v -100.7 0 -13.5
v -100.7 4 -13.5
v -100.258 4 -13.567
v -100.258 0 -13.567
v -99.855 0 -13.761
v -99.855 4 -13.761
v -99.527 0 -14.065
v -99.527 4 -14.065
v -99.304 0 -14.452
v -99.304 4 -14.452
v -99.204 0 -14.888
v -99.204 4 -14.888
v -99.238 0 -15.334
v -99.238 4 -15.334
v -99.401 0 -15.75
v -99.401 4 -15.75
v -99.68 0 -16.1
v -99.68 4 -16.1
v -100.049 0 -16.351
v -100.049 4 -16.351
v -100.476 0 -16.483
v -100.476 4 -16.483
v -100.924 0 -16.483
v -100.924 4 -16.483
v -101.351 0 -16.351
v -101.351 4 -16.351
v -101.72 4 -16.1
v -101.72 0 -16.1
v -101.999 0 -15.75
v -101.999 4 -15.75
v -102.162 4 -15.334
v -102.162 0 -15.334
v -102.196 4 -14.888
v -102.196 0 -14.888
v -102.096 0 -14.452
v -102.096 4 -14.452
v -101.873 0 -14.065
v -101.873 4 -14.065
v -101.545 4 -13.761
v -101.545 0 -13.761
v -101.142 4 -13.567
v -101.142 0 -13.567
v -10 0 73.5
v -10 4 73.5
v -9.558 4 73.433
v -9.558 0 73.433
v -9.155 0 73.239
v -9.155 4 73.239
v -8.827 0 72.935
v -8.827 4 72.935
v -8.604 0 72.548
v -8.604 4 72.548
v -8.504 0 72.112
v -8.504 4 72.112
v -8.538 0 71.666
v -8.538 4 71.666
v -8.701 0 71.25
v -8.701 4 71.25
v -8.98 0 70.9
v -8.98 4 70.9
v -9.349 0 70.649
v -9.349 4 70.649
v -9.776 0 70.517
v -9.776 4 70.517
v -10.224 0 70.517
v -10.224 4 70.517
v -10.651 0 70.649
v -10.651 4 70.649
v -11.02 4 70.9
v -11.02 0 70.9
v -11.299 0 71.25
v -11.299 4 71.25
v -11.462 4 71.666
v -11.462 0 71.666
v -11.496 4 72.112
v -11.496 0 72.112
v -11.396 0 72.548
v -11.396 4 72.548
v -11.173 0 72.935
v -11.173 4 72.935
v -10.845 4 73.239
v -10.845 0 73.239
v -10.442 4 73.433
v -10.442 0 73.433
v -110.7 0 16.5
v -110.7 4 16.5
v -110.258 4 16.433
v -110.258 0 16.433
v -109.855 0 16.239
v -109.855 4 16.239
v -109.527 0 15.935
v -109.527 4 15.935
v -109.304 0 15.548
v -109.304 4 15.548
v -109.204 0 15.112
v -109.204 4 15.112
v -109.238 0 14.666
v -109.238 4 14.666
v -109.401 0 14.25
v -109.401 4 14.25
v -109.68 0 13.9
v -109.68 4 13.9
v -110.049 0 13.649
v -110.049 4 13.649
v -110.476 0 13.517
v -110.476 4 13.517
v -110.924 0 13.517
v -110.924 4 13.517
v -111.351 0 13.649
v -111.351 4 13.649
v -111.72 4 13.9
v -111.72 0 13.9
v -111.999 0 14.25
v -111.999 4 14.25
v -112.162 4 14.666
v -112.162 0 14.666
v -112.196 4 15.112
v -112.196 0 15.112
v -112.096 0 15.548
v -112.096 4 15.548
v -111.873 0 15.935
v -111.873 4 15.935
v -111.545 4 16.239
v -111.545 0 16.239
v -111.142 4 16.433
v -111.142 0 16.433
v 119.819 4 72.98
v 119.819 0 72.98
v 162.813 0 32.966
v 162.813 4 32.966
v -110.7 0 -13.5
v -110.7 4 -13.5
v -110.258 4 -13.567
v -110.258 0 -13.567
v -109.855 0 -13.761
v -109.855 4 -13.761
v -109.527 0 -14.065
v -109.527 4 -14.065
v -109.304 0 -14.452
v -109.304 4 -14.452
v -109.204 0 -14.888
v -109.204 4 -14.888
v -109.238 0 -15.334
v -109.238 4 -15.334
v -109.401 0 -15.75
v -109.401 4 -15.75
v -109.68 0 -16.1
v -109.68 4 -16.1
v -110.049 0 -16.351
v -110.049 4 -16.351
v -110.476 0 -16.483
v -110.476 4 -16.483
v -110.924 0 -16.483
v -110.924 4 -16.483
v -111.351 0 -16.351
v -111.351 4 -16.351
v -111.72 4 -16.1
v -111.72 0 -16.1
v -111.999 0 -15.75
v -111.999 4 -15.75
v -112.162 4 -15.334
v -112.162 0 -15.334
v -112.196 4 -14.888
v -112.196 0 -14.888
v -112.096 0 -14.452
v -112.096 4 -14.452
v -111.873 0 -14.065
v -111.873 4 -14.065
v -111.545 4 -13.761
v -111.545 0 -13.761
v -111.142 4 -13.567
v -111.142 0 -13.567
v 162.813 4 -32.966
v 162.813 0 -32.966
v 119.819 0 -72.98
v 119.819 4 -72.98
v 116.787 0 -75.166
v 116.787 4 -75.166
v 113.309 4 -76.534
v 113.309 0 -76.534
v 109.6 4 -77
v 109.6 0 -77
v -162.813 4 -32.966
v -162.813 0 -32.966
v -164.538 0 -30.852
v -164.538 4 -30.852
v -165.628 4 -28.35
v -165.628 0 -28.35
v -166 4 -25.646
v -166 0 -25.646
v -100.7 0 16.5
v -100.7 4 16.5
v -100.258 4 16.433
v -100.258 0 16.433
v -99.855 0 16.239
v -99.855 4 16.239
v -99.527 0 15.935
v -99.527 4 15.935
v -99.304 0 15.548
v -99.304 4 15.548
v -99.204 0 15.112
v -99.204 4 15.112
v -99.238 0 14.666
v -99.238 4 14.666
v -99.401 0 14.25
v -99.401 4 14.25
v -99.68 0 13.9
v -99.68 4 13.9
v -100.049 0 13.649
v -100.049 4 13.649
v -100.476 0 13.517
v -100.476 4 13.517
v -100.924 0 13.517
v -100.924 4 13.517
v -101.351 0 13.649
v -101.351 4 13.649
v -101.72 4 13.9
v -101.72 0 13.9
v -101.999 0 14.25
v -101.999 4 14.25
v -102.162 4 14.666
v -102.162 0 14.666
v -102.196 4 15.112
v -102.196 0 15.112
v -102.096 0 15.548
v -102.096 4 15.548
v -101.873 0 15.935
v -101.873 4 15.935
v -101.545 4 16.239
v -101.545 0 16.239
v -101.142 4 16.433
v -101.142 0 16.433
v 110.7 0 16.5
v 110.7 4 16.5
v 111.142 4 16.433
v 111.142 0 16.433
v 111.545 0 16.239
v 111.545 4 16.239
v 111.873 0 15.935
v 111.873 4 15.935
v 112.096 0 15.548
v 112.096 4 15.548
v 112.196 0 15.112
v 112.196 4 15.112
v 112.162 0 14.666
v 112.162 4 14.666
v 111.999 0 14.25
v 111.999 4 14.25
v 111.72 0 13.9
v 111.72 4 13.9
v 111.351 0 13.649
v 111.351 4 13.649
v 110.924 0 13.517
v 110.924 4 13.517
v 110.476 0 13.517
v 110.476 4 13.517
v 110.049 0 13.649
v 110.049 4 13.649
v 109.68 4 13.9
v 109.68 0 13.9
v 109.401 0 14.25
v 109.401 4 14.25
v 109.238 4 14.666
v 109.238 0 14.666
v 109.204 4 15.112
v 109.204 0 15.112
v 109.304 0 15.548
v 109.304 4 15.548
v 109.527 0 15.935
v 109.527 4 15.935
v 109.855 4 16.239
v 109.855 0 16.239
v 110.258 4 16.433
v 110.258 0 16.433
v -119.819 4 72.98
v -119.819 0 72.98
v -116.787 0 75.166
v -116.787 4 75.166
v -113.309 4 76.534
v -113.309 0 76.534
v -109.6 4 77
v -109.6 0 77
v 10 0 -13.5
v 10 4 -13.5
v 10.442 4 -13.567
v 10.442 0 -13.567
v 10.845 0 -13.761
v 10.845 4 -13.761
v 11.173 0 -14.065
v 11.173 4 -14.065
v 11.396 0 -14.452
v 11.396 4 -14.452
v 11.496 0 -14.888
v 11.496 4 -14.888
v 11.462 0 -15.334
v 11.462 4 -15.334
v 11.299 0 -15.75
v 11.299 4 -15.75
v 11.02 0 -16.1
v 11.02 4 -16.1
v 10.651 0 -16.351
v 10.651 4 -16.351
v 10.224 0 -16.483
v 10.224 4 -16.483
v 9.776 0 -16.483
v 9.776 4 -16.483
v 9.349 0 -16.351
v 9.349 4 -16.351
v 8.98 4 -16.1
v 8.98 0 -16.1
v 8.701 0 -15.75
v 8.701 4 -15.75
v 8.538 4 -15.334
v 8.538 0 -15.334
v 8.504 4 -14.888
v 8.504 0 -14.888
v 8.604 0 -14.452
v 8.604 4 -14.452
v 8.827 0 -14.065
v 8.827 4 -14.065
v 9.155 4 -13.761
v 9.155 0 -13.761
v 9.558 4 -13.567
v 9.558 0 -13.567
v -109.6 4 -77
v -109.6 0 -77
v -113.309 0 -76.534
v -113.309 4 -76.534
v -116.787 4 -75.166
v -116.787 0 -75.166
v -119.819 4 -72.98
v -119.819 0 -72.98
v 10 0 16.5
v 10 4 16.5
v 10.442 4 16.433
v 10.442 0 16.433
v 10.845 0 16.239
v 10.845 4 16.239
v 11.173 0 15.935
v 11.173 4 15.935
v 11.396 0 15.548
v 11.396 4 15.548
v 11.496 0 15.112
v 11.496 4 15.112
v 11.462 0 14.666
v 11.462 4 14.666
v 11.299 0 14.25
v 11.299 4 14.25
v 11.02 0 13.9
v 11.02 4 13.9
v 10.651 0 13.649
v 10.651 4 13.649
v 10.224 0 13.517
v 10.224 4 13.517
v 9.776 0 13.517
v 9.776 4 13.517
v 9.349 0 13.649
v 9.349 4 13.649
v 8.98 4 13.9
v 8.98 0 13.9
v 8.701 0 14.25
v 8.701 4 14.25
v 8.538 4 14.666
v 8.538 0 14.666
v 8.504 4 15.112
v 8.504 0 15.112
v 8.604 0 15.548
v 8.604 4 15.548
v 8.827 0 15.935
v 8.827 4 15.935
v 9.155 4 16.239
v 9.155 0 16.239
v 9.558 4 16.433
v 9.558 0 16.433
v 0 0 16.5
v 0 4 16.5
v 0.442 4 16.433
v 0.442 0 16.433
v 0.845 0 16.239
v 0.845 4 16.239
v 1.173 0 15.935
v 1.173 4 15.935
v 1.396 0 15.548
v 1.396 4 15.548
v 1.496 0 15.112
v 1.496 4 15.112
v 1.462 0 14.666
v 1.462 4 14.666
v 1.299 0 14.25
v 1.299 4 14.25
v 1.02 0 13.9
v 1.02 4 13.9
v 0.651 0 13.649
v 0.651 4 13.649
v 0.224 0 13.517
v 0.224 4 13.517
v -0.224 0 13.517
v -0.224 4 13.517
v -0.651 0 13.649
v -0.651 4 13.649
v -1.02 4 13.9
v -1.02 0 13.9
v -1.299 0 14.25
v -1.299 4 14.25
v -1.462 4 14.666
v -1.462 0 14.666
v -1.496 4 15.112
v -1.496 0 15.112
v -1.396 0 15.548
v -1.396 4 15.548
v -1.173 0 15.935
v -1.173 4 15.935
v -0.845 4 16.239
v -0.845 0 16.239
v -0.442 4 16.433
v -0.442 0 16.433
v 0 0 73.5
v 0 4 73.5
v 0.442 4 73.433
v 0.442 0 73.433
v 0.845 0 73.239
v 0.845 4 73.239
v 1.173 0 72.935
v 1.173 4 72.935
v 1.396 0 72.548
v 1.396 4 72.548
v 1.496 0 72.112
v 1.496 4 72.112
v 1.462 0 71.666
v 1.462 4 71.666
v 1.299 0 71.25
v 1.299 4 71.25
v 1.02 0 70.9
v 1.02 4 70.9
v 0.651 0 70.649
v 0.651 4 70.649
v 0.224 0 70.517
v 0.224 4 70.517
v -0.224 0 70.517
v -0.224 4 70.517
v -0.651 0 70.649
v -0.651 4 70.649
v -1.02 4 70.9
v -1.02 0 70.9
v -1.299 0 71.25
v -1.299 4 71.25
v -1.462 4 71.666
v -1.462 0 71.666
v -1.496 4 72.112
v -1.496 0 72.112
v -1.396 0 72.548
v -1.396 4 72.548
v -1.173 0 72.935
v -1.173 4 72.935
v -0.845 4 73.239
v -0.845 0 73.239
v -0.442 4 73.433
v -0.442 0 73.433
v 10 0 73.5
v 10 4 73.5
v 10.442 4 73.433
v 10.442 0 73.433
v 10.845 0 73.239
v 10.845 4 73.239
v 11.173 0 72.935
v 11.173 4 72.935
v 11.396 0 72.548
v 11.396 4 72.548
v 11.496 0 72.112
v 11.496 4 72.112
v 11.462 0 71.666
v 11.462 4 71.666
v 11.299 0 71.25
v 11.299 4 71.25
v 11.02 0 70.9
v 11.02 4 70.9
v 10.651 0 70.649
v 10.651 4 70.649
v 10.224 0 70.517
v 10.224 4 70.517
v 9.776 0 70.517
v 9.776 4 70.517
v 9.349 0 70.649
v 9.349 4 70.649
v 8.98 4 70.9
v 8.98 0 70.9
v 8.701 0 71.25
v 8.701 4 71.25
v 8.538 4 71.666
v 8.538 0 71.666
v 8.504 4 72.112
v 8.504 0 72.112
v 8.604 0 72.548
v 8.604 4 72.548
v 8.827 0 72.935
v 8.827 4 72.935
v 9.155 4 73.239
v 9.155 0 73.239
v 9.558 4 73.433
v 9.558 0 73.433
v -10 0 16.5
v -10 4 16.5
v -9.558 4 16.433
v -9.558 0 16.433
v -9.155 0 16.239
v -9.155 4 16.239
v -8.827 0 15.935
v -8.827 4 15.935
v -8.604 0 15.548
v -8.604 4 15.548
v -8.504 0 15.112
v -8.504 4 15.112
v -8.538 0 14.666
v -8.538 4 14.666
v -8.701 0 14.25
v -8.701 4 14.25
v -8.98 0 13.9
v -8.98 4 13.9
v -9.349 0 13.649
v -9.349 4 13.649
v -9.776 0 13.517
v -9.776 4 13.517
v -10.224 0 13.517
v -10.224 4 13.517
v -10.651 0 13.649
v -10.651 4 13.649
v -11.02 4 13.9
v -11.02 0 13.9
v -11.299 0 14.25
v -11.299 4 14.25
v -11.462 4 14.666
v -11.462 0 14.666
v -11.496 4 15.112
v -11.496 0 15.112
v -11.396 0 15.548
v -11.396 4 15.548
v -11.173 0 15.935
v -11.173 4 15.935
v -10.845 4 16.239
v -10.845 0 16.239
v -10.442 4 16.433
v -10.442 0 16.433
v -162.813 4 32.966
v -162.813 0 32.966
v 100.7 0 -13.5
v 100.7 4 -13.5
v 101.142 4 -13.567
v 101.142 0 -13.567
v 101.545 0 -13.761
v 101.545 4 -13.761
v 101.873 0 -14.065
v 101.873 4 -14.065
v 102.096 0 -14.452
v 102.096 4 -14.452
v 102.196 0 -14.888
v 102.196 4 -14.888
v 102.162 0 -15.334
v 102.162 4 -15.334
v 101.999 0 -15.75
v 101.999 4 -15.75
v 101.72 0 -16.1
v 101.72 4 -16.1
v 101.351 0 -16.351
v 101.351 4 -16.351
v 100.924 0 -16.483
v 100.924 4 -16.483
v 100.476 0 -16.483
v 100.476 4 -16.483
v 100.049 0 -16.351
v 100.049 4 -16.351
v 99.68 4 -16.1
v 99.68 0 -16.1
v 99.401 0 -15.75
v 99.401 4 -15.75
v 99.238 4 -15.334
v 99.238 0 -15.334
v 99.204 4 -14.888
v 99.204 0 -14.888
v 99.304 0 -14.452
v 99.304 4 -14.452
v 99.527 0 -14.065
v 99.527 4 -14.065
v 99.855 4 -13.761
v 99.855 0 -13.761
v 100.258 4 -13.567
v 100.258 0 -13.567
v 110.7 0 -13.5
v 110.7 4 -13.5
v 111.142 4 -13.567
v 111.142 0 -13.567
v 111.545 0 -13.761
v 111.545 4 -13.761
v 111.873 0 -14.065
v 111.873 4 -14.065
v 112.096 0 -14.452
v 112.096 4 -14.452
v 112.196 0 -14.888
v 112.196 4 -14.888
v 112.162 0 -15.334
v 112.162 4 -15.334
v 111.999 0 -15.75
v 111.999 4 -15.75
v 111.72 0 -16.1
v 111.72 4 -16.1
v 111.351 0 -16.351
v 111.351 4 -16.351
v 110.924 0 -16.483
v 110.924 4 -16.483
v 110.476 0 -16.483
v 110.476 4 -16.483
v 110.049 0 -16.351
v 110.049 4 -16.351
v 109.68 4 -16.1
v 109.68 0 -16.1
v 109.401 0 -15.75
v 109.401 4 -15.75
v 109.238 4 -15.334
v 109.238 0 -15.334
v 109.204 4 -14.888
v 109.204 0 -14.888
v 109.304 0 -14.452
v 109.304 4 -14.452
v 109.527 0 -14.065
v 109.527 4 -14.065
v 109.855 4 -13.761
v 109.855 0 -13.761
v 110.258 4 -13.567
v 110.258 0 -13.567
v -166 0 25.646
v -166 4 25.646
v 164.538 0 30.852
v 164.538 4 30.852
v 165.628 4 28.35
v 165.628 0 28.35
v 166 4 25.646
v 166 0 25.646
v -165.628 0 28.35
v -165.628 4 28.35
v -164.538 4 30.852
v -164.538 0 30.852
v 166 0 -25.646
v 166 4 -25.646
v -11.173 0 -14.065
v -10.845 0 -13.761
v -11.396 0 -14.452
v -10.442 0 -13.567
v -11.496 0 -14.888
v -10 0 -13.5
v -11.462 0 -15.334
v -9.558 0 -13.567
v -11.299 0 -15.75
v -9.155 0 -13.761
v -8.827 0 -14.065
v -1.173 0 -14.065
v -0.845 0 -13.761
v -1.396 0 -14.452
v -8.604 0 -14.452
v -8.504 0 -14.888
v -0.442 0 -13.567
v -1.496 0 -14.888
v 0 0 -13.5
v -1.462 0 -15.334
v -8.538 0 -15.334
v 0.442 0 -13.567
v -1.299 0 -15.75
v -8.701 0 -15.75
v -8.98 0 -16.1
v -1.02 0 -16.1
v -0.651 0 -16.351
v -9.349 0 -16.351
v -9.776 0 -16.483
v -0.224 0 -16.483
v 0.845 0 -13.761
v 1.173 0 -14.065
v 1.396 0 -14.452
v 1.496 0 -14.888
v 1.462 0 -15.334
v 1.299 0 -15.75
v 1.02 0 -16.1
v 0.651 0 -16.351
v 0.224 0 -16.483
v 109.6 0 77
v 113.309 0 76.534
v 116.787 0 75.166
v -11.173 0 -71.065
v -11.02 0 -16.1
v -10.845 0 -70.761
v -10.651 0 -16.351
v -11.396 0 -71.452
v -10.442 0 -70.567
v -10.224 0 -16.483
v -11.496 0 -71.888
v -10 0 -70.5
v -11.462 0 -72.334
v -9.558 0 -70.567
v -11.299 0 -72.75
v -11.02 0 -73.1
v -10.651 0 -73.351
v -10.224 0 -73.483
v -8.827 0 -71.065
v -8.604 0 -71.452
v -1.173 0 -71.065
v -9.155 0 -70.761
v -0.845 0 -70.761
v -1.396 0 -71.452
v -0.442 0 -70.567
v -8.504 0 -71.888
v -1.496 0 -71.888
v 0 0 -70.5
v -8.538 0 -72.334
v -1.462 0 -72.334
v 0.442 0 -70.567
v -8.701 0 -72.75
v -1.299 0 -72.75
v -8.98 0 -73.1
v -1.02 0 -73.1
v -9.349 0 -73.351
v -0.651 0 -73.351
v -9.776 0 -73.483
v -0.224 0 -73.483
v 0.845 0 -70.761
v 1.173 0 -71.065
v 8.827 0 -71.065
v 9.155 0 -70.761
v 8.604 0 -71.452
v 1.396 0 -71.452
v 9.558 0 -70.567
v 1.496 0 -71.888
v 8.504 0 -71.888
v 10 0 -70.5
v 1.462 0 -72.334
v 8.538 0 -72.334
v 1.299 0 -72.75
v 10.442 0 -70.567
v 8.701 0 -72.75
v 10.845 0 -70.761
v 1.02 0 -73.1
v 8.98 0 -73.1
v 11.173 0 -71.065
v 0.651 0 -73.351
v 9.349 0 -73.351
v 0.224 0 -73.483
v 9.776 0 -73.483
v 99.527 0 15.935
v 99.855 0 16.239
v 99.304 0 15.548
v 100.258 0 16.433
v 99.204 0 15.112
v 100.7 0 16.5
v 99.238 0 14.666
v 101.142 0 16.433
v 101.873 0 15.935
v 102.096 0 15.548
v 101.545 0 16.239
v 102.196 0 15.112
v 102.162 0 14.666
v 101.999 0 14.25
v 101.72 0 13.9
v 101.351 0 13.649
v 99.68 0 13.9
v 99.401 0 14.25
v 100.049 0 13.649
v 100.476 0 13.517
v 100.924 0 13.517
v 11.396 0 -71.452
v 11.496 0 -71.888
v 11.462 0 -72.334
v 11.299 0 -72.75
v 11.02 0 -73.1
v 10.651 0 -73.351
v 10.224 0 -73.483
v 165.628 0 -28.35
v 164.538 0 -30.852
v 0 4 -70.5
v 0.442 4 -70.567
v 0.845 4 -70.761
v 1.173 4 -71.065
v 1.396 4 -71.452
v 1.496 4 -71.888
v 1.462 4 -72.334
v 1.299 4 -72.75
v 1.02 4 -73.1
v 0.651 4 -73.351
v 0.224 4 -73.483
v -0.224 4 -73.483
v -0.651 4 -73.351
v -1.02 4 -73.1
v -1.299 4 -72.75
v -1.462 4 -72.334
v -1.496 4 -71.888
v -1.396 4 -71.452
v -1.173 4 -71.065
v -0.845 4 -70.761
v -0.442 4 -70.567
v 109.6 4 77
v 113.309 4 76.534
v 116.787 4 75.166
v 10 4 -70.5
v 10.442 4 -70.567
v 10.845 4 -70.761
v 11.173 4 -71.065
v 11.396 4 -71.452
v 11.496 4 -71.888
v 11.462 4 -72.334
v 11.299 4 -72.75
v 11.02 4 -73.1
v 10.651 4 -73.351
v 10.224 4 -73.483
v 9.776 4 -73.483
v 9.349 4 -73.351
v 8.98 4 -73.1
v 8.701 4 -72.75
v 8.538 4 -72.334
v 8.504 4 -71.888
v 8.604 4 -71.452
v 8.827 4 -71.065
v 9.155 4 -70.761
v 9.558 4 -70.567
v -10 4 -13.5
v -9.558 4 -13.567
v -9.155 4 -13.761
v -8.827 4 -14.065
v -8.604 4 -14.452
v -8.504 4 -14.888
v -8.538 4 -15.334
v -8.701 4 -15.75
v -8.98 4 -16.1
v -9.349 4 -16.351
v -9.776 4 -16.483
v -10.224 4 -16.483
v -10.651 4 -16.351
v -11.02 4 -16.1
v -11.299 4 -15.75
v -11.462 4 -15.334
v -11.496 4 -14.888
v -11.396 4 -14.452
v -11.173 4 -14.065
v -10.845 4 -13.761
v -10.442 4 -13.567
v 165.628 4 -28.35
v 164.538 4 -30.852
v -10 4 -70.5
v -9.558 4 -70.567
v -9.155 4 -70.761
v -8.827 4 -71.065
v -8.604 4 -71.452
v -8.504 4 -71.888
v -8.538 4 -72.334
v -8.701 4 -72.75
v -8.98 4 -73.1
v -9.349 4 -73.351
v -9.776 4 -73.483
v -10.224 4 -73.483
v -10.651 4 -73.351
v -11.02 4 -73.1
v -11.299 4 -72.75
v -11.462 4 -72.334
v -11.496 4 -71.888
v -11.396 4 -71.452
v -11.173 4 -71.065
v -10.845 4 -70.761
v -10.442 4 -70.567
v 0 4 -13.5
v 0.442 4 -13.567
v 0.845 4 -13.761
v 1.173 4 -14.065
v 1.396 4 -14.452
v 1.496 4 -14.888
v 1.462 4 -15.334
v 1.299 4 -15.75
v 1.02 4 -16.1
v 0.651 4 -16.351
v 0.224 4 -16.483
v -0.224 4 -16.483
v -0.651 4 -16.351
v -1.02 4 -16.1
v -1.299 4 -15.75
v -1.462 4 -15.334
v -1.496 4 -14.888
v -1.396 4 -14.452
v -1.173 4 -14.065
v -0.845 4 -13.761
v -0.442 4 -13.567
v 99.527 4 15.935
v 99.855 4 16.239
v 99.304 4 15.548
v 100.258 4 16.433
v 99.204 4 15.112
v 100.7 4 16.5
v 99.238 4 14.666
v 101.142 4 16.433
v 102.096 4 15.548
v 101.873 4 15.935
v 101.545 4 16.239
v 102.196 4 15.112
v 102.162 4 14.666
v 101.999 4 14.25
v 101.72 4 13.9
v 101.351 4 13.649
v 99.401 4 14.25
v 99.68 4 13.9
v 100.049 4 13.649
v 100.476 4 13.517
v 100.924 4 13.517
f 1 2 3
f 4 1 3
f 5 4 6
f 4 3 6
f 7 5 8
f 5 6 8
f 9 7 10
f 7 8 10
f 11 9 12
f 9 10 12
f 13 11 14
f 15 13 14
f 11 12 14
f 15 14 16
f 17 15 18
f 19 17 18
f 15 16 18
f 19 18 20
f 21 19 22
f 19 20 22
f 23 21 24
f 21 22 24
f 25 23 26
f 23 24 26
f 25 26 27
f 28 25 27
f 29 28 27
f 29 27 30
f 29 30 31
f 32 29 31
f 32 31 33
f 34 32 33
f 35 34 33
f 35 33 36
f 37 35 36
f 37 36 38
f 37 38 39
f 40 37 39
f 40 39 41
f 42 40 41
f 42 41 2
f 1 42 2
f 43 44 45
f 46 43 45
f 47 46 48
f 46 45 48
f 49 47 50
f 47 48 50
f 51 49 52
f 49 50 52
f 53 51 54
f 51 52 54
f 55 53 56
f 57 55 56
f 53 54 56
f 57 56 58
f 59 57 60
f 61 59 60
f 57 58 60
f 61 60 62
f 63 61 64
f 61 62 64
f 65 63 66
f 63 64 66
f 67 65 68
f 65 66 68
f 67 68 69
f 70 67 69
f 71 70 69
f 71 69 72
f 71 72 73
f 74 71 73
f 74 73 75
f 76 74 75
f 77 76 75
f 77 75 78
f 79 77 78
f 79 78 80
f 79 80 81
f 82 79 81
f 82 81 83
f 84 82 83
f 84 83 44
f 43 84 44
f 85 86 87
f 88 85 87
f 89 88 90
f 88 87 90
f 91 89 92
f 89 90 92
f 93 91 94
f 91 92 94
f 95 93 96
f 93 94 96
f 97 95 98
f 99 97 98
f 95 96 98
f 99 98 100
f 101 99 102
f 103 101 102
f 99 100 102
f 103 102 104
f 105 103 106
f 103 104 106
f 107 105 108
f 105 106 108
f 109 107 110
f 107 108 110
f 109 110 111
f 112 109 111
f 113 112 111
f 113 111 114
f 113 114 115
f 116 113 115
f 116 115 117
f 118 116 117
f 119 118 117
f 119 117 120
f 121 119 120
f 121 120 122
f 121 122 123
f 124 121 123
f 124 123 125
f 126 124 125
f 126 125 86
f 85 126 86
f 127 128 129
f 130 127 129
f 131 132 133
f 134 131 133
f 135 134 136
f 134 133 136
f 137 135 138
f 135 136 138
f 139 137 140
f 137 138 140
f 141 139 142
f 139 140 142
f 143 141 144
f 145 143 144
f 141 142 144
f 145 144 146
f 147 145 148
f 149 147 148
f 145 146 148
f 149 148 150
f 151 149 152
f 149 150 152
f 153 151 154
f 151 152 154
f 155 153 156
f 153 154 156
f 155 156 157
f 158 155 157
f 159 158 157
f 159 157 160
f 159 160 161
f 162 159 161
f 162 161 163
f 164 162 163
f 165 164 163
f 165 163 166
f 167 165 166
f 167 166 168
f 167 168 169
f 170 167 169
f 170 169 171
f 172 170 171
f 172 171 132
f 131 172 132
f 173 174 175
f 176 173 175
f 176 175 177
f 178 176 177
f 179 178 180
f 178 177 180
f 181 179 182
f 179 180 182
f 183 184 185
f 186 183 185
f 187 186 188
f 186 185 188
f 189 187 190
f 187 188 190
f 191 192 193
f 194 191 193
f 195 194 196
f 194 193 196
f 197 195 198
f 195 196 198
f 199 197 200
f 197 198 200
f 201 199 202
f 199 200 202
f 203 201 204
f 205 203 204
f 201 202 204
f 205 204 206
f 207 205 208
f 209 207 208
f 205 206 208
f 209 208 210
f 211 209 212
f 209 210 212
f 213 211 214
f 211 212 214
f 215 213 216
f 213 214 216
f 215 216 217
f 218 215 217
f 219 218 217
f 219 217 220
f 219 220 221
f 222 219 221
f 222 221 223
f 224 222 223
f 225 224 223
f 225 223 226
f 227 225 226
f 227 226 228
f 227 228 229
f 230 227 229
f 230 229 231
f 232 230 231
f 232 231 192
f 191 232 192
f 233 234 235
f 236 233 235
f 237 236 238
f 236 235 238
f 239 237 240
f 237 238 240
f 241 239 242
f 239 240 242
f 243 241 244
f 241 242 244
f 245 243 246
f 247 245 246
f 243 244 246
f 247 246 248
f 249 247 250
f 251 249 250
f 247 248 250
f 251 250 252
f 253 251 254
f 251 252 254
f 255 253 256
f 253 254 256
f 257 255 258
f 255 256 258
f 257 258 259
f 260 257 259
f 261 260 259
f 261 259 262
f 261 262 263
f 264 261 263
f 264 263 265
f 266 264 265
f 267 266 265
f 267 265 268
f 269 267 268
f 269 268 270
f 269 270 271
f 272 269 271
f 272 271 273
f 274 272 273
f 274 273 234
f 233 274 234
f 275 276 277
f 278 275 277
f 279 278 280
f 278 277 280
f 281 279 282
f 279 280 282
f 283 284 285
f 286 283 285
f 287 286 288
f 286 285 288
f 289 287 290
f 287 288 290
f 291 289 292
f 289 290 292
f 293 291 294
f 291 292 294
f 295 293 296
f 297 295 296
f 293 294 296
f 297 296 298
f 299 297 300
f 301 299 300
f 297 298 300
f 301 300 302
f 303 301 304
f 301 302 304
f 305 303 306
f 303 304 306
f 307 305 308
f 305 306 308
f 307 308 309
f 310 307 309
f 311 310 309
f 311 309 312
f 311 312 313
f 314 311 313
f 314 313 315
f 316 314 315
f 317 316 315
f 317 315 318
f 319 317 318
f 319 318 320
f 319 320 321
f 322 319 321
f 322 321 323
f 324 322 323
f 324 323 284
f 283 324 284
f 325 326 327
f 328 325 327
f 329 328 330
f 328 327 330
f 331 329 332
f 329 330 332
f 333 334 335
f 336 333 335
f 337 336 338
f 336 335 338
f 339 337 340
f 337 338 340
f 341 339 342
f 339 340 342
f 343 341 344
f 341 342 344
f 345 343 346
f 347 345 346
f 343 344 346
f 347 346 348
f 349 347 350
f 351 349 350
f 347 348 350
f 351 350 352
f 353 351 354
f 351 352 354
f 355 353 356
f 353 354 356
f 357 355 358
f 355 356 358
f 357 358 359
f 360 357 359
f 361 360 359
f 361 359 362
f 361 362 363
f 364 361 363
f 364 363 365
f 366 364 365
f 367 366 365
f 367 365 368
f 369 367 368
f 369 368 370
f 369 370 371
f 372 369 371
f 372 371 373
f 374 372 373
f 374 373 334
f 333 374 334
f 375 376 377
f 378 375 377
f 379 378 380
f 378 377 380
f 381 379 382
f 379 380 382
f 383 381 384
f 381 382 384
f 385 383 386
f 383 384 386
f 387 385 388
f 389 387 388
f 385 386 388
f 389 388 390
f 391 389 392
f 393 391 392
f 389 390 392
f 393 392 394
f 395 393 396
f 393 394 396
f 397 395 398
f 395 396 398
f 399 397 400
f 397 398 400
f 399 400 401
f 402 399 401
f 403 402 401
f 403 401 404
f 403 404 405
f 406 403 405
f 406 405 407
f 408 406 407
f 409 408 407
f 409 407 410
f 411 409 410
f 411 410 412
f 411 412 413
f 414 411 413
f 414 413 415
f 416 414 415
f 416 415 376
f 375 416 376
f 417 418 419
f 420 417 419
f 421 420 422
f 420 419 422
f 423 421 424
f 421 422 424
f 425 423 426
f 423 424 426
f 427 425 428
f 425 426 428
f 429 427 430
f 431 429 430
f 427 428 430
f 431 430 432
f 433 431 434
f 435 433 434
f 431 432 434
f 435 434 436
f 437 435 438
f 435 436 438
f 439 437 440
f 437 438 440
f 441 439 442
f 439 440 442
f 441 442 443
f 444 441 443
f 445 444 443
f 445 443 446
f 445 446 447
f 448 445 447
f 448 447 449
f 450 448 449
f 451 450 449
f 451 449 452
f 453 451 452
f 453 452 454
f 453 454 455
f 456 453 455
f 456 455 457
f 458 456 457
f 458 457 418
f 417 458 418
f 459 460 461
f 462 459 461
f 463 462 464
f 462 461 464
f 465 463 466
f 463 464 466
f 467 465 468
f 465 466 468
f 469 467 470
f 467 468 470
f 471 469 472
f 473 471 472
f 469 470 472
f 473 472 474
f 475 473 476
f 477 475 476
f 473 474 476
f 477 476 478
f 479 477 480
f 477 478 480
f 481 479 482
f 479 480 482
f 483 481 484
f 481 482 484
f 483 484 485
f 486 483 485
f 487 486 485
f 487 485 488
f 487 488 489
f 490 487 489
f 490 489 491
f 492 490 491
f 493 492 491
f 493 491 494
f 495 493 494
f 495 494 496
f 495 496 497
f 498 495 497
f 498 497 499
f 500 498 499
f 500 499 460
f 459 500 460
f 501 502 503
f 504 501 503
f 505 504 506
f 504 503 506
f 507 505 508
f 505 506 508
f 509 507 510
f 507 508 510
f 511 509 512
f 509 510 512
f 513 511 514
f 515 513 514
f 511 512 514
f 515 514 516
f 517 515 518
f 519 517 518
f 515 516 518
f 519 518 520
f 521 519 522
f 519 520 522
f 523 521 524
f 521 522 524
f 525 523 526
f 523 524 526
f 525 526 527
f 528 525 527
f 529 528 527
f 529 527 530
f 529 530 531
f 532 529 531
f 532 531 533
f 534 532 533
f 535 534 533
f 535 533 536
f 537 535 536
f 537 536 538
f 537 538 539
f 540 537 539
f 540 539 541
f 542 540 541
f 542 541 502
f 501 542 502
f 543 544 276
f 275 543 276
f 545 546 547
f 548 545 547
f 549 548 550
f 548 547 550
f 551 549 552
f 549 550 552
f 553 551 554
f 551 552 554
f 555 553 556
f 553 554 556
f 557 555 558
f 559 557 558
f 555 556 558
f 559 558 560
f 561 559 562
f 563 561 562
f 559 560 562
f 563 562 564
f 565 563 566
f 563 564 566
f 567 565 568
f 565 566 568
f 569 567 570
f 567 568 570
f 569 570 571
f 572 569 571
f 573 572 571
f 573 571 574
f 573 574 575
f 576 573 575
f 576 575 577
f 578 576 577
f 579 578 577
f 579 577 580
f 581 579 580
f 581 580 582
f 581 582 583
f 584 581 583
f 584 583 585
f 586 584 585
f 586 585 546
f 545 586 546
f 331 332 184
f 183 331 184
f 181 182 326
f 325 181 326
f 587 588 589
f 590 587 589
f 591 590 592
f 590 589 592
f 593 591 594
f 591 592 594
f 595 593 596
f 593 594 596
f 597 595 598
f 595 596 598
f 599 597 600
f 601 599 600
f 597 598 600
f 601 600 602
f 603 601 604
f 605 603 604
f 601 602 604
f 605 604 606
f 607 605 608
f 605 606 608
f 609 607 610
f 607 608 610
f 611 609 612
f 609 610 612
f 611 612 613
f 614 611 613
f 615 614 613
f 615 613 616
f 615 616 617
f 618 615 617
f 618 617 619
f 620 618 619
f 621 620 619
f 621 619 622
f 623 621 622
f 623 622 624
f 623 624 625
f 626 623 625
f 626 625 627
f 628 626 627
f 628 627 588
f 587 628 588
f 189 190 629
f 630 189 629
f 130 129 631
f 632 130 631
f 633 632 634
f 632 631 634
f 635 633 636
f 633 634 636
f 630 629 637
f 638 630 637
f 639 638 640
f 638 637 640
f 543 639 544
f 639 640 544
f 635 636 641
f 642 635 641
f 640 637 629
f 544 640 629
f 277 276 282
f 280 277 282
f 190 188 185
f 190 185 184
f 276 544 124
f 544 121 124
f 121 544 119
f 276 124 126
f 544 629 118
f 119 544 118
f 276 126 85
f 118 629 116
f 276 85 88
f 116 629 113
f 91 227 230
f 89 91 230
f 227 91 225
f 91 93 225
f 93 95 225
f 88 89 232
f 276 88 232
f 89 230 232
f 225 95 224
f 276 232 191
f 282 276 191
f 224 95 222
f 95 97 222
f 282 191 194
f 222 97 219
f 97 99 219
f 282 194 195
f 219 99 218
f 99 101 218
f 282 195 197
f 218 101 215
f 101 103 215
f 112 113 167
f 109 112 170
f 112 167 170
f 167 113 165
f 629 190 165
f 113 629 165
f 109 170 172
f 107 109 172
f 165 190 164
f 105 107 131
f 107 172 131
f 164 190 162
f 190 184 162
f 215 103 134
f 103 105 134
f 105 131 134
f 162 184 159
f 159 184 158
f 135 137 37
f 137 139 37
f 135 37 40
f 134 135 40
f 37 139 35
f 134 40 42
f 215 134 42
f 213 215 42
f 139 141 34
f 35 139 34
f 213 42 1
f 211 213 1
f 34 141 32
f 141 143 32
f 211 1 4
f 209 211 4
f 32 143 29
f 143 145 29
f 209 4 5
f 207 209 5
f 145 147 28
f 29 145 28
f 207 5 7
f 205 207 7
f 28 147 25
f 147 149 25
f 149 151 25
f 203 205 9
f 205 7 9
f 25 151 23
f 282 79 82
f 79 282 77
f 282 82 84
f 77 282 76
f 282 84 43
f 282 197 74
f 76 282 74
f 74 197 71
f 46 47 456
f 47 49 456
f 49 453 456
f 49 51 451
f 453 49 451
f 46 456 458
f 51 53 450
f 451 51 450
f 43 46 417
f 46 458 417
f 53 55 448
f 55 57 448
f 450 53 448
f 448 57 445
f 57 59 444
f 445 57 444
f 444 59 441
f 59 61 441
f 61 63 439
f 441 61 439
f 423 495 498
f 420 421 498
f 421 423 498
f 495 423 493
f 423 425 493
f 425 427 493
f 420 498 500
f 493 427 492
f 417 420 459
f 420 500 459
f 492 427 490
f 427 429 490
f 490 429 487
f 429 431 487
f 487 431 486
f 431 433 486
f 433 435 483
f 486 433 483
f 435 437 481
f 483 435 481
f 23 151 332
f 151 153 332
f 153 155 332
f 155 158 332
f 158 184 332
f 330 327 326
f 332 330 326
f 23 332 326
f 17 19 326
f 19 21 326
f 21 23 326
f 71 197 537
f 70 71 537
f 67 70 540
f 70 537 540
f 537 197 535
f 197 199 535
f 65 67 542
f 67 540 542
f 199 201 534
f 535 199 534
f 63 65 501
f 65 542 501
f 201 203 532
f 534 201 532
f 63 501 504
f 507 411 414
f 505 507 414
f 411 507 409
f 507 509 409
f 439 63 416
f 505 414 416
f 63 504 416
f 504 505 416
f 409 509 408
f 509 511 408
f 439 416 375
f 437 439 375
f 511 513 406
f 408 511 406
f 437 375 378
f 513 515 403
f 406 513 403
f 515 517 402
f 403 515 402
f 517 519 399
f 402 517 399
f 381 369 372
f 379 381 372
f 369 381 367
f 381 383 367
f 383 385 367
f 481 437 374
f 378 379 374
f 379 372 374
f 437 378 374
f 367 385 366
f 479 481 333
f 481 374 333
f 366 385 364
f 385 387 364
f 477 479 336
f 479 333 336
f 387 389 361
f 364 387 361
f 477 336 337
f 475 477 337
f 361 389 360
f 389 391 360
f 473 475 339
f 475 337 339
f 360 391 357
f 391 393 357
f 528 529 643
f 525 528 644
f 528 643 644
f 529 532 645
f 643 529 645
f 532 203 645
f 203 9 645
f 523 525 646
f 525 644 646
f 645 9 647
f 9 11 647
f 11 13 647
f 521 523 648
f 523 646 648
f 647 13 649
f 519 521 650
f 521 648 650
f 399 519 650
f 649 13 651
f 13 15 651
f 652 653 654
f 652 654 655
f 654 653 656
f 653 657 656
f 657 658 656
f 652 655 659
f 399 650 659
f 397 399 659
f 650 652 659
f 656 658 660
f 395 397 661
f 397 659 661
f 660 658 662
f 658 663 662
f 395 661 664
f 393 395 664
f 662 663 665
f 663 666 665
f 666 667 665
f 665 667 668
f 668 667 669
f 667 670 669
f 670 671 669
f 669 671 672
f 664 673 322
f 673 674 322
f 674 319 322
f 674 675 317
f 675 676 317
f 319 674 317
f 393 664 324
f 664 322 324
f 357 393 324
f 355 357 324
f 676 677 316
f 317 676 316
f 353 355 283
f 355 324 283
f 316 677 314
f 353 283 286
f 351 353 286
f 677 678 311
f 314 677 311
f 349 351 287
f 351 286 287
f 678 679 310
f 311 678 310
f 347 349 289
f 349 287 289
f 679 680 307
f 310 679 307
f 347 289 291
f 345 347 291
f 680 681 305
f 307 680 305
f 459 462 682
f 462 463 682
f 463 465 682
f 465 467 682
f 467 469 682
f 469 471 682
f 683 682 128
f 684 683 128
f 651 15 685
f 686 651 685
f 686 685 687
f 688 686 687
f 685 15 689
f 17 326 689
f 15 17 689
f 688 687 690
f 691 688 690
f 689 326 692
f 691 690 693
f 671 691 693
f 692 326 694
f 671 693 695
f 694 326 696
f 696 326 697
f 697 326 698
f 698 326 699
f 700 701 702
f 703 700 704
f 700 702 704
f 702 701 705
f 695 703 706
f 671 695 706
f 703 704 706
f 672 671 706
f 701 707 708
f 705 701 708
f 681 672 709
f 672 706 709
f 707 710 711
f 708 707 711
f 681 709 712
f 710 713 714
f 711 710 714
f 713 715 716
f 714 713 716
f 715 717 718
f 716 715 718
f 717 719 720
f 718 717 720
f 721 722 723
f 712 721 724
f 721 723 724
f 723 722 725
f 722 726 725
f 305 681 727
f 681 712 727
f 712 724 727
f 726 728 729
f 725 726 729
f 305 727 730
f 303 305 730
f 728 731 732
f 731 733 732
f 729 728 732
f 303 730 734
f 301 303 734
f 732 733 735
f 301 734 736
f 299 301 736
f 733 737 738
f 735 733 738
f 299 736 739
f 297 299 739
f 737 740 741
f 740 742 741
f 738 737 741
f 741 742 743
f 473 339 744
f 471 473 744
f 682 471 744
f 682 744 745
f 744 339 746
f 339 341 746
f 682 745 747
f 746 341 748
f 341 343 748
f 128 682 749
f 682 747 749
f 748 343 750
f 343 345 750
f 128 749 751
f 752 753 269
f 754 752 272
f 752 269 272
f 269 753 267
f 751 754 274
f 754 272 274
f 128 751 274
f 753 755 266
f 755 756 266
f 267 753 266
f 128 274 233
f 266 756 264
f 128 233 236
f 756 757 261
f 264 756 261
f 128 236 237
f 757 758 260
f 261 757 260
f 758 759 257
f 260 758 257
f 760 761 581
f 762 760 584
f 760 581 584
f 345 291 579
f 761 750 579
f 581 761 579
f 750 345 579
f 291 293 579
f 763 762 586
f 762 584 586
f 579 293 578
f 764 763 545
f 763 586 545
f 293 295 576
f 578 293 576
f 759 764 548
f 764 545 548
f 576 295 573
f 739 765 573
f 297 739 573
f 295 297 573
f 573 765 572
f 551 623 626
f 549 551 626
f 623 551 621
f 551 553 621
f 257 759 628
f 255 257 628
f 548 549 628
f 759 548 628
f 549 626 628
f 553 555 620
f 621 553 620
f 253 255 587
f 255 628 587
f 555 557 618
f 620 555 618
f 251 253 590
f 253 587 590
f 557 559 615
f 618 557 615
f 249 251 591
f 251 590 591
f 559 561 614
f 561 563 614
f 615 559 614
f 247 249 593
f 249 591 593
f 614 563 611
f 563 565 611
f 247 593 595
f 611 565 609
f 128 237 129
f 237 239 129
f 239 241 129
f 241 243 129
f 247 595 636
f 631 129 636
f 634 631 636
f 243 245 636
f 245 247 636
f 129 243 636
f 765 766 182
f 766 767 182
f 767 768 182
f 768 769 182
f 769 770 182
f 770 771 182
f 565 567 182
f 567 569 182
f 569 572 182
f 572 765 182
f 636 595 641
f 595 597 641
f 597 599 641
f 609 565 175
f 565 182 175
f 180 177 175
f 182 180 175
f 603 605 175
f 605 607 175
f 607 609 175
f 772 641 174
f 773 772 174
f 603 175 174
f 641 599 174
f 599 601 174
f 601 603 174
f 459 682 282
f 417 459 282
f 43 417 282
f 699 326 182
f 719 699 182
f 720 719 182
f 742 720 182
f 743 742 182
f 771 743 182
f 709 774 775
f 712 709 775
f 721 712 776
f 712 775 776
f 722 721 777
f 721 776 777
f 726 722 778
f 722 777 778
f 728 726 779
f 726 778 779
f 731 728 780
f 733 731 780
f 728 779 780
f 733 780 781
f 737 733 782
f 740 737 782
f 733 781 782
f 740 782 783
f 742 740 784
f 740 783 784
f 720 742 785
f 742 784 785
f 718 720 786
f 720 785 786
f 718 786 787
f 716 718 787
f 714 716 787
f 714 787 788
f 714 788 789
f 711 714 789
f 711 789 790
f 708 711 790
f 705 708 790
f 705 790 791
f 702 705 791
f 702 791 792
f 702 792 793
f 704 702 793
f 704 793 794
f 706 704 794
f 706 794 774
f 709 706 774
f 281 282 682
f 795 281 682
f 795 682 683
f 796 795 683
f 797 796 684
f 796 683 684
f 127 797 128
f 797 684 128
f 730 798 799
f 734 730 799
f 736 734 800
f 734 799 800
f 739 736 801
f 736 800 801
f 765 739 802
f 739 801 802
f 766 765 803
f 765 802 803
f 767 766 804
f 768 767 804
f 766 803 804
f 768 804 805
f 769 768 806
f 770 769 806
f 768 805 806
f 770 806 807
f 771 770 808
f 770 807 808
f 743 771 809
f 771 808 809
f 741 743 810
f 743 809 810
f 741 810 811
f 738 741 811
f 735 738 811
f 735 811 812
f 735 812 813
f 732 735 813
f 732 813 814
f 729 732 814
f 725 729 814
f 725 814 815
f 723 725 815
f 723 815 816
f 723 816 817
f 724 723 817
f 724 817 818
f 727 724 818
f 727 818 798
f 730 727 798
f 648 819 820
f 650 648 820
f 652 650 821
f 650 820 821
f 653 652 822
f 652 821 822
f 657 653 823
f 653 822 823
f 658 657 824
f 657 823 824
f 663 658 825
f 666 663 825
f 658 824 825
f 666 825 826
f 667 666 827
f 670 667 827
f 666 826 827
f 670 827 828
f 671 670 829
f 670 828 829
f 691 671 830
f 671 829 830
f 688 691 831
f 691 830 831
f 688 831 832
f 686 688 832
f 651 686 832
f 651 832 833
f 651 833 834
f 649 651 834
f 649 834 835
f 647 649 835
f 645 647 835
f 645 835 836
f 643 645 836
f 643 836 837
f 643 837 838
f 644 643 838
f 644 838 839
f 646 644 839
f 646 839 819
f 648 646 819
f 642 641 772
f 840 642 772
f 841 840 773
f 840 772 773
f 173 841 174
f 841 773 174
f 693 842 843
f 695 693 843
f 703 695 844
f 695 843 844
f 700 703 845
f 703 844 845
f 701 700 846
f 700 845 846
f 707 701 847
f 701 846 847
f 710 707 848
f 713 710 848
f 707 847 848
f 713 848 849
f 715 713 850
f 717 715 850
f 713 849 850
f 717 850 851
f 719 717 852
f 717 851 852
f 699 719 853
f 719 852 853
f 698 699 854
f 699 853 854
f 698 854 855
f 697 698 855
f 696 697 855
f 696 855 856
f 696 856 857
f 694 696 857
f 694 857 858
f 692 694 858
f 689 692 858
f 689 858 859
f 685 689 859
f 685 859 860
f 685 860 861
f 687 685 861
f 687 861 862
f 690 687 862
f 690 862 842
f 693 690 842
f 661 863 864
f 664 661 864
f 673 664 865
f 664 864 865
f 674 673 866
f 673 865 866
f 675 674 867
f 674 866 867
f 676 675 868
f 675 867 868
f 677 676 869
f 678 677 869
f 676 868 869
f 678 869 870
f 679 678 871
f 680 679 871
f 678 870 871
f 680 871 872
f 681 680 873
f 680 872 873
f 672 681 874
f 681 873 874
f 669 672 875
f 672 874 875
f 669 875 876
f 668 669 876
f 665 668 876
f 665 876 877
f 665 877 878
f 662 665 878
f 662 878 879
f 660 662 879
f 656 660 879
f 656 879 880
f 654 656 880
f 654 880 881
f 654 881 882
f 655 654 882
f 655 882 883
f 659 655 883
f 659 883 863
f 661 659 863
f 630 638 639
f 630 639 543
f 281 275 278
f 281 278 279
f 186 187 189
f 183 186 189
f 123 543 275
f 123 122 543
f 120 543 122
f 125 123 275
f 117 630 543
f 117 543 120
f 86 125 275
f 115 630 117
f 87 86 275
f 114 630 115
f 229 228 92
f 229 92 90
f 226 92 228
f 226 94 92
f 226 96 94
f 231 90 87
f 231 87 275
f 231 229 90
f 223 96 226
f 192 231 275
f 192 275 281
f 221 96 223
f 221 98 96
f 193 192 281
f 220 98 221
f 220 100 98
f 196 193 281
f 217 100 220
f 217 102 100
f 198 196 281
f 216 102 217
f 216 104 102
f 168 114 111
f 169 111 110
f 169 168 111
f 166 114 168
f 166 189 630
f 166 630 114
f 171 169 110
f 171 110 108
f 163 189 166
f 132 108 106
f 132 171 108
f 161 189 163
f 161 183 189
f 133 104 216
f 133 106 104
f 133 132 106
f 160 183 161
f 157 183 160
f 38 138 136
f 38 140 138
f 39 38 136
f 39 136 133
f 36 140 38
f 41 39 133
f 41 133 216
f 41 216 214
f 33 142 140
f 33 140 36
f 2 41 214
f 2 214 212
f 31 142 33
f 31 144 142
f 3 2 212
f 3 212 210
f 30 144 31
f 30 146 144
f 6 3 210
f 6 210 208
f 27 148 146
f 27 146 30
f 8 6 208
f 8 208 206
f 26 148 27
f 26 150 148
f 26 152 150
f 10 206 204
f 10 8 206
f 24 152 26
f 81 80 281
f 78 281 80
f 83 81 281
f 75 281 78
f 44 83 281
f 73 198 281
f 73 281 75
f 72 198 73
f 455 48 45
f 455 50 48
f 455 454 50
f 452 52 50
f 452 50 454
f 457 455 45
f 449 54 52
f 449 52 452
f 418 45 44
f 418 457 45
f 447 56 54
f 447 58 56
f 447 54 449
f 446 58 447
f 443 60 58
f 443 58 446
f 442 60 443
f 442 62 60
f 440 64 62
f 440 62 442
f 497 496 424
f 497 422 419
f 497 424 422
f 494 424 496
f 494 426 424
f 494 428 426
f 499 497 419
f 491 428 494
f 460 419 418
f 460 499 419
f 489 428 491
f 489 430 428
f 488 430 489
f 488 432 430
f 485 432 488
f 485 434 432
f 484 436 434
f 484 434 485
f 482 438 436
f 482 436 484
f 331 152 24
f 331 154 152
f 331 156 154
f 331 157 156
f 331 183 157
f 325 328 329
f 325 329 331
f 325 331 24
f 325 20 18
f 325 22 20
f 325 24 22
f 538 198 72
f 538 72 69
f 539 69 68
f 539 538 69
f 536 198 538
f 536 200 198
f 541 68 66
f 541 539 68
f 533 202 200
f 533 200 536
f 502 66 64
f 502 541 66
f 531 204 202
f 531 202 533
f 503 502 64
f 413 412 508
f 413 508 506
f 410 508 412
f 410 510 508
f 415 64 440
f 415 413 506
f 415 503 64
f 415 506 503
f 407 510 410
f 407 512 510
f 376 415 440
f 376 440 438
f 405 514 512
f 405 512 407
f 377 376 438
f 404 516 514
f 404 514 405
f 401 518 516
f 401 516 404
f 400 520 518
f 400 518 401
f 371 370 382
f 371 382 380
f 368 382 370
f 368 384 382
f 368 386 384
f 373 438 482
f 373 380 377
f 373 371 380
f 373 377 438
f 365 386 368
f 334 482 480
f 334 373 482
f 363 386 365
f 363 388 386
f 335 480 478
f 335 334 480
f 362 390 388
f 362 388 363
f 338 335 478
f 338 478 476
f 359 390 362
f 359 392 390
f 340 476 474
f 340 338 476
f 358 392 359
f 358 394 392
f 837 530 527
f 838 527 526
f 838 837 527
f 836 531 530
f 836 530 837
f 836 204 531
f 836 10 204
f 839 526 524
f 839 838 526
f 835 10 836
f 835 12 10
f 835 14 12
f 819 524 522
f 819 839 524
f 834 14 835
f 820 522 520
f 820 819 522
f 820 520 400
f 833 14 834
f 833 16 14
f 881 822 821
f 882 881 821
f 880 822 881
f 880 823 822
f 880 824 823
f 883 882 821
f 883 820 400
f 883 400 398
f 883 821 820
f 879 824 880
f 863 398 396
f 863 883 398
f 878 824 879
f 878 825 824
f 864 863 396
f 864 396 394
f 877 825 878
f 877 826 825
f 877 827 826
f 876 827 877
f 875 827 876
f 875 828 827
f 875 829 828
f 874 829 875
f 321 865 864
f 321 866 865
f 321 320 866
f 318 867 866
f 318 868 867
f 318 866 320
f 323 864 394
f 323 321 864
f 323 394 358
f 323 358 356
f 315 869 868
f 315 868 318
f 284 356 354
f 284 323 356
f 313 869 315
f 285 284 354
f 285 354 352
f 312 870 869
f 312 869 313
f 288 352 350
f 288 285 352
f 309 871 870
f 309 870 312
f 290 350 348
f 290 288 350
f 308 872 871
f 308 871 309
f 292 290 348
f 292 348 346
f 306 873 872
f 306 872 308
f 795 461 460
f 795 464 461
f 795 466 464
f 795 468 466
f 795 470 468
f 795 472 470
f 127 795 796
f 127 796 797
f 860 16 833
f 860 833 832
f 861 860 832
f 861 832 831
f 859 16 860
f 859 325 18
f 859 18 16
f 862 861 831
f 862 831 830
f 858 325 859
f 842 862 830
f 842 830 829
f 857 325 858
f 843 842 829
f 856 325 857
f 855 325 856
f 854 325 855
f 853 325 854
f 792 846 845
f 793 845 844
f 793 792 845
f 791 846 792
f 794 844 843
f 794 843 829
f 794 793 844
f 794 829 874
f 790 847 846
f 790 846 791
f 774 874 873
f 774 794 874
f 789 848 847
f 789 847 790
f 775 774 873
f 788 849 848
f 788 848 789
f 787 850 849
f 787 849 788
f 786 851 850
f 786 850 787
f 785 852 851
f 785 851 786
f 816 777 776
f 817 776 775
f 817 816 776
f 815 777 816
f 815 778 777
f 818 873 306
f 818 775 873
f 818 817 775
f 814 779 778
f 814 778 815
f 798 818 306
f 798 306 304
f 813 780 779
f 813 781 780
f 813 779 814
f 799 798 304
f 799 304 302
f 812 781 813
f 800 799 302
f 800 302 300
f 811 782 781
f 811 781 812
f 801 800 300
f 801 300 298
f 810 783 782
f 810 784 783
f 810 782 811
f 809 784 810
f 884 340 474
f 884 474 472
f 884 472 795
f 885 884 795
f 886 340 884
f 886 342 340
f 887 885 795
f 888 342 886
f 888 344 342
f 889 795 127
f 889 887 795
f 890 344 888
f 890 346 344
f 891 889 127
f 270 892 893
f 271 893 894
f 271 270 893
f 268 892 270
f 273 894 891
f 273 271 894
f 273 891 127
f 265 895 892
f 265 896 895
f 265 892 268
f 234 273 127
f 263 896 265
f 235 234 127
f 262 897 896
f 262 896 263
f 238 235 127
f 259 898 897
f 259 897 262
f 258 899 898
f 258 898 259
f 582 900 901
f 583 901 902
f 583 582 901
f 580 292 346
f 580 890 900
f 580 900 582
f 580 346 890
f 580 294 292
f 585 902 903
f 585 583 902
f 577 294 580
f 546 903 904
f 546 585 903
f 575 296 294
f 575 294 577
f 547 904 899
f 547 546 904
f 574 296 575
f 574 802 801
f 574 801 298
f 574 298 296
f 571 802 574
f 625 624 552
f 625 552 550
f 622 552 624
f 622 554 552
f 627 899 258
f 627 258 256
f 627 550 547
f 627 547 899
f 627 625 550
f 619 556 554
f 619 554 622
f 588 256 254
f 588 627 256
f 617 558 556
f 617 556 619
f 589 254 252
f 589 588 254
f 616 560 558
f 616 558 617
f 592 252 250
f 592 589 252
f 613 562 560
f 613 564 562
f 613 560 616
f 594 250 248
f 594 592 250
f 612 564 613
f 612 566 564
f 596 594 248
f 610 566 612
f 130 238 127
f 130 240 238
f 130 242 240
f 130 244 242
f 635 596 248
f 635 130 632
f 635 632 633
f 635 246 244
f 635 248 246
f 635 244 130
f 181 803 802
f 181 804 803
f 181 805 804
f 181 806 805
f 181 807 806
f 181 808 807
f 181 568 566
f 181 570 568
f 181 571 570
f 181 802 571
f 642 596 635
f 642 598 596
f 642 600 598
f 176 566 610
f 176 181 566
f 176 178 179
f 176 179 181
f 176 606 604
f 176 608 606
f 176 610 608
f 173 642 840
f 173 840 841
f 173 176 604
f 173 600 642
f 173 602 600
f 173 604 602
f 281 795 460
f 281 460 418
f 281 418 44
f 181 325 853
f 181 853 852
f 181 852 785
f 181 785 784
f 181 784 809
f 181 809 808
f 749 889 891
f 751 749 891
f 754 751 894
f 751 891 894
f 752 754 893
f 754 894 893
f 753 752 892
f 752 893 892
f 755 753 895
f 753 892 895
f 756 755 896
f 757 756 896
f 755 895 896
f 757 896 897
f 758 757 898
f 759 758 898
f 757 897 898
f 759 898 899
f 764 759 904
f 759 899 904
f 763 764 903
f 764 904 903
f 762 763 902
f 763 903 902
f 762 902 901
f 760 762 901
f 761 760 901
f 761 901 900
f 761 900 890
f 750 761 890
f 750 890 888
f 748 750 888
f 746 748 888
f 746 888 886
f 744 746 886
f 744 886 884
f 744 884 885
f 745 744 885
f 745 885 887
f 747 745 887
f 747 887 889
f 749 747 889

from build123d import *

# Parameters (mm, degrees)
EXTRUDE_1_DEPTH     = 4
SKETCH_3_R          = 1.5
CUT_EXTRUDE_1_DEPTH = 184.032783949


with BuildPart() as part:
    # 草图1 → 凸台-拉伸1 (new body)
    with BuildSketch(Plane(origin=(0, 0, 0), x_dir=(1, 0, 0), z_dir=(0, 1, 0))):
        with BuildLine():
            Line((-119.819061856, 72.980279065), (-162.812846416, 32.966261751))
            ThreePointArc((-162.812846416, 32.966261751), (-165.168654868, 29.638038623), (-166, 25.646075708))
            Line((-166, 25.646075708), (-166, -25.646075708))
            ThreePointArc((-166, -25.646075708), (-165.168654868, -29.638038623), (-162.812846416, -32.966261751))
            Line((-162.812846416, -32.966261751), (-119.819061856, -72.980279065))
            ThreePointArc((-119.819061856, -72.980279065), (-115.090503207, -75.958943119), (-109.599792231, -77))
            Line((-109.599792231, -77), (109.599792231, -77))
            ThreePointArc((109.599792231, -77), (115.090503207, -75.958943119), (119.819061856, -72.980279065))
            Line((119.819061856, -72.980279065), (162.812846416, -32.966261751))
            ThreePointArc((162.812846416, -32.966261751), (165.168654868, -29.638038623), (166, -25.646075708))
            Line((166, -25.646075708), (166, 25.646075708))
            ThreePointArc((166, 25.646075708), (165.168654868, 29.638038623), (162.812846416, 32.966261751))
            Line((162.812846416, 32.966261751), (119.819061856, 72.980279065))
            ThreePointArc((119.819061856, 72.980279065), (115.090503207, 75.958943119), (109.599792231, 77))
            Line((109.599792231, 77), (-109.599792231, 77))
            ThreePointArc((-109.599792231, 77), (-115.090503207, 75.958943119), (-119.819061856, 72.980279065))
        make_face()
    extrude(amount=EXTRUDE_1_DEPTH)

    # 草图3 → 切除-拉伸1 (cut, through all)
    with BuildSketch(Plane(origin=(0, 4, 0), x_dir=(1, 0, 0), z_dir=(0, 1, 0))):
        with Locations(Location((10, -72, 0), (0, 0, 270))):
            Circle(SKETCH_3_R)
        with Locations(Location((0, -72, 0), (0, 0, 270))):
            Circle(SKETCH_3_R)
        with Locations(Location((-10, -72, 0), (0, 0, 270))):
            Circle(SKETCH_3_R)
        with Locations(Location((10, -15, 0), (0, 0, 270))):
            Circle(SKETCH_3_R)
        with Locations(Location((0, -15, 0), (0, 0, 270))):
            Circle(SKETCH_3_R)
        with Locations(Location((-10, -15, 0), (0, 0, 270))):
            Circle(SKETCH_3_R)
        with Locations(Location((10, 15, 0), (0, 0, 270))):
            Circle(SKETCH_3_R)
        with Locations(Location((0, 15, 0), (0, 0, 270))):
            Circle(SKETCH_3_R)
        with Locations(Location((-10, 15, 0), (0, 0, 270))):
            Circle(SKETCH_3_R)
        with Locations(Location((10, 72, 0), (0, 0, 270))):
            Circle(SKETCH_3_R)
        with Locations(Location((0, 72, 0), (0, 0, 270))):
            Circle(SKETCH_3_R)
        with Locations(Location((-10, 72, 0), (0, 0, 270))):
            Circle(SKETCH_3_R)
        with Locations(Location((-100.7, 15, 0), (0, 0, 270))):
            Circle(SKETCH_3_R)
        with Locations(Location((-110.7, 15, 0), (0, 0, 270))):
            Circle(SKETCH_3_R)
        with Locations(Location((-100.7, -15, 0), (0, 0, 270))):
            Circle(SKETCH_3_R)
        with Locations(Location((-110.7, -15, 0), (0, 0, 270))):
            Circle(SKETCH_3_R)
        with Locations(Location((100.7, 15, 0), (0, 0, 270))):
            Circle(SKETCH_3_R)
        with Locations(Location((110.7, 15, 0), (0, 0, 270))):
            Circle(SKETCH_3_R)
        with Locations(Location((100.7, -15, 0), (0, 0, 270))):
            Circle(SKETCH_3_R)
        with Locations(Location((110.7, -15, 0), (0, 0, 270))):
            Circle(SKETCH_3_R)
    extrude(amount=-CUT_EXTRUDE_1_DEPTH, mode=Mode.SUBTRACT)


solid = part.part
